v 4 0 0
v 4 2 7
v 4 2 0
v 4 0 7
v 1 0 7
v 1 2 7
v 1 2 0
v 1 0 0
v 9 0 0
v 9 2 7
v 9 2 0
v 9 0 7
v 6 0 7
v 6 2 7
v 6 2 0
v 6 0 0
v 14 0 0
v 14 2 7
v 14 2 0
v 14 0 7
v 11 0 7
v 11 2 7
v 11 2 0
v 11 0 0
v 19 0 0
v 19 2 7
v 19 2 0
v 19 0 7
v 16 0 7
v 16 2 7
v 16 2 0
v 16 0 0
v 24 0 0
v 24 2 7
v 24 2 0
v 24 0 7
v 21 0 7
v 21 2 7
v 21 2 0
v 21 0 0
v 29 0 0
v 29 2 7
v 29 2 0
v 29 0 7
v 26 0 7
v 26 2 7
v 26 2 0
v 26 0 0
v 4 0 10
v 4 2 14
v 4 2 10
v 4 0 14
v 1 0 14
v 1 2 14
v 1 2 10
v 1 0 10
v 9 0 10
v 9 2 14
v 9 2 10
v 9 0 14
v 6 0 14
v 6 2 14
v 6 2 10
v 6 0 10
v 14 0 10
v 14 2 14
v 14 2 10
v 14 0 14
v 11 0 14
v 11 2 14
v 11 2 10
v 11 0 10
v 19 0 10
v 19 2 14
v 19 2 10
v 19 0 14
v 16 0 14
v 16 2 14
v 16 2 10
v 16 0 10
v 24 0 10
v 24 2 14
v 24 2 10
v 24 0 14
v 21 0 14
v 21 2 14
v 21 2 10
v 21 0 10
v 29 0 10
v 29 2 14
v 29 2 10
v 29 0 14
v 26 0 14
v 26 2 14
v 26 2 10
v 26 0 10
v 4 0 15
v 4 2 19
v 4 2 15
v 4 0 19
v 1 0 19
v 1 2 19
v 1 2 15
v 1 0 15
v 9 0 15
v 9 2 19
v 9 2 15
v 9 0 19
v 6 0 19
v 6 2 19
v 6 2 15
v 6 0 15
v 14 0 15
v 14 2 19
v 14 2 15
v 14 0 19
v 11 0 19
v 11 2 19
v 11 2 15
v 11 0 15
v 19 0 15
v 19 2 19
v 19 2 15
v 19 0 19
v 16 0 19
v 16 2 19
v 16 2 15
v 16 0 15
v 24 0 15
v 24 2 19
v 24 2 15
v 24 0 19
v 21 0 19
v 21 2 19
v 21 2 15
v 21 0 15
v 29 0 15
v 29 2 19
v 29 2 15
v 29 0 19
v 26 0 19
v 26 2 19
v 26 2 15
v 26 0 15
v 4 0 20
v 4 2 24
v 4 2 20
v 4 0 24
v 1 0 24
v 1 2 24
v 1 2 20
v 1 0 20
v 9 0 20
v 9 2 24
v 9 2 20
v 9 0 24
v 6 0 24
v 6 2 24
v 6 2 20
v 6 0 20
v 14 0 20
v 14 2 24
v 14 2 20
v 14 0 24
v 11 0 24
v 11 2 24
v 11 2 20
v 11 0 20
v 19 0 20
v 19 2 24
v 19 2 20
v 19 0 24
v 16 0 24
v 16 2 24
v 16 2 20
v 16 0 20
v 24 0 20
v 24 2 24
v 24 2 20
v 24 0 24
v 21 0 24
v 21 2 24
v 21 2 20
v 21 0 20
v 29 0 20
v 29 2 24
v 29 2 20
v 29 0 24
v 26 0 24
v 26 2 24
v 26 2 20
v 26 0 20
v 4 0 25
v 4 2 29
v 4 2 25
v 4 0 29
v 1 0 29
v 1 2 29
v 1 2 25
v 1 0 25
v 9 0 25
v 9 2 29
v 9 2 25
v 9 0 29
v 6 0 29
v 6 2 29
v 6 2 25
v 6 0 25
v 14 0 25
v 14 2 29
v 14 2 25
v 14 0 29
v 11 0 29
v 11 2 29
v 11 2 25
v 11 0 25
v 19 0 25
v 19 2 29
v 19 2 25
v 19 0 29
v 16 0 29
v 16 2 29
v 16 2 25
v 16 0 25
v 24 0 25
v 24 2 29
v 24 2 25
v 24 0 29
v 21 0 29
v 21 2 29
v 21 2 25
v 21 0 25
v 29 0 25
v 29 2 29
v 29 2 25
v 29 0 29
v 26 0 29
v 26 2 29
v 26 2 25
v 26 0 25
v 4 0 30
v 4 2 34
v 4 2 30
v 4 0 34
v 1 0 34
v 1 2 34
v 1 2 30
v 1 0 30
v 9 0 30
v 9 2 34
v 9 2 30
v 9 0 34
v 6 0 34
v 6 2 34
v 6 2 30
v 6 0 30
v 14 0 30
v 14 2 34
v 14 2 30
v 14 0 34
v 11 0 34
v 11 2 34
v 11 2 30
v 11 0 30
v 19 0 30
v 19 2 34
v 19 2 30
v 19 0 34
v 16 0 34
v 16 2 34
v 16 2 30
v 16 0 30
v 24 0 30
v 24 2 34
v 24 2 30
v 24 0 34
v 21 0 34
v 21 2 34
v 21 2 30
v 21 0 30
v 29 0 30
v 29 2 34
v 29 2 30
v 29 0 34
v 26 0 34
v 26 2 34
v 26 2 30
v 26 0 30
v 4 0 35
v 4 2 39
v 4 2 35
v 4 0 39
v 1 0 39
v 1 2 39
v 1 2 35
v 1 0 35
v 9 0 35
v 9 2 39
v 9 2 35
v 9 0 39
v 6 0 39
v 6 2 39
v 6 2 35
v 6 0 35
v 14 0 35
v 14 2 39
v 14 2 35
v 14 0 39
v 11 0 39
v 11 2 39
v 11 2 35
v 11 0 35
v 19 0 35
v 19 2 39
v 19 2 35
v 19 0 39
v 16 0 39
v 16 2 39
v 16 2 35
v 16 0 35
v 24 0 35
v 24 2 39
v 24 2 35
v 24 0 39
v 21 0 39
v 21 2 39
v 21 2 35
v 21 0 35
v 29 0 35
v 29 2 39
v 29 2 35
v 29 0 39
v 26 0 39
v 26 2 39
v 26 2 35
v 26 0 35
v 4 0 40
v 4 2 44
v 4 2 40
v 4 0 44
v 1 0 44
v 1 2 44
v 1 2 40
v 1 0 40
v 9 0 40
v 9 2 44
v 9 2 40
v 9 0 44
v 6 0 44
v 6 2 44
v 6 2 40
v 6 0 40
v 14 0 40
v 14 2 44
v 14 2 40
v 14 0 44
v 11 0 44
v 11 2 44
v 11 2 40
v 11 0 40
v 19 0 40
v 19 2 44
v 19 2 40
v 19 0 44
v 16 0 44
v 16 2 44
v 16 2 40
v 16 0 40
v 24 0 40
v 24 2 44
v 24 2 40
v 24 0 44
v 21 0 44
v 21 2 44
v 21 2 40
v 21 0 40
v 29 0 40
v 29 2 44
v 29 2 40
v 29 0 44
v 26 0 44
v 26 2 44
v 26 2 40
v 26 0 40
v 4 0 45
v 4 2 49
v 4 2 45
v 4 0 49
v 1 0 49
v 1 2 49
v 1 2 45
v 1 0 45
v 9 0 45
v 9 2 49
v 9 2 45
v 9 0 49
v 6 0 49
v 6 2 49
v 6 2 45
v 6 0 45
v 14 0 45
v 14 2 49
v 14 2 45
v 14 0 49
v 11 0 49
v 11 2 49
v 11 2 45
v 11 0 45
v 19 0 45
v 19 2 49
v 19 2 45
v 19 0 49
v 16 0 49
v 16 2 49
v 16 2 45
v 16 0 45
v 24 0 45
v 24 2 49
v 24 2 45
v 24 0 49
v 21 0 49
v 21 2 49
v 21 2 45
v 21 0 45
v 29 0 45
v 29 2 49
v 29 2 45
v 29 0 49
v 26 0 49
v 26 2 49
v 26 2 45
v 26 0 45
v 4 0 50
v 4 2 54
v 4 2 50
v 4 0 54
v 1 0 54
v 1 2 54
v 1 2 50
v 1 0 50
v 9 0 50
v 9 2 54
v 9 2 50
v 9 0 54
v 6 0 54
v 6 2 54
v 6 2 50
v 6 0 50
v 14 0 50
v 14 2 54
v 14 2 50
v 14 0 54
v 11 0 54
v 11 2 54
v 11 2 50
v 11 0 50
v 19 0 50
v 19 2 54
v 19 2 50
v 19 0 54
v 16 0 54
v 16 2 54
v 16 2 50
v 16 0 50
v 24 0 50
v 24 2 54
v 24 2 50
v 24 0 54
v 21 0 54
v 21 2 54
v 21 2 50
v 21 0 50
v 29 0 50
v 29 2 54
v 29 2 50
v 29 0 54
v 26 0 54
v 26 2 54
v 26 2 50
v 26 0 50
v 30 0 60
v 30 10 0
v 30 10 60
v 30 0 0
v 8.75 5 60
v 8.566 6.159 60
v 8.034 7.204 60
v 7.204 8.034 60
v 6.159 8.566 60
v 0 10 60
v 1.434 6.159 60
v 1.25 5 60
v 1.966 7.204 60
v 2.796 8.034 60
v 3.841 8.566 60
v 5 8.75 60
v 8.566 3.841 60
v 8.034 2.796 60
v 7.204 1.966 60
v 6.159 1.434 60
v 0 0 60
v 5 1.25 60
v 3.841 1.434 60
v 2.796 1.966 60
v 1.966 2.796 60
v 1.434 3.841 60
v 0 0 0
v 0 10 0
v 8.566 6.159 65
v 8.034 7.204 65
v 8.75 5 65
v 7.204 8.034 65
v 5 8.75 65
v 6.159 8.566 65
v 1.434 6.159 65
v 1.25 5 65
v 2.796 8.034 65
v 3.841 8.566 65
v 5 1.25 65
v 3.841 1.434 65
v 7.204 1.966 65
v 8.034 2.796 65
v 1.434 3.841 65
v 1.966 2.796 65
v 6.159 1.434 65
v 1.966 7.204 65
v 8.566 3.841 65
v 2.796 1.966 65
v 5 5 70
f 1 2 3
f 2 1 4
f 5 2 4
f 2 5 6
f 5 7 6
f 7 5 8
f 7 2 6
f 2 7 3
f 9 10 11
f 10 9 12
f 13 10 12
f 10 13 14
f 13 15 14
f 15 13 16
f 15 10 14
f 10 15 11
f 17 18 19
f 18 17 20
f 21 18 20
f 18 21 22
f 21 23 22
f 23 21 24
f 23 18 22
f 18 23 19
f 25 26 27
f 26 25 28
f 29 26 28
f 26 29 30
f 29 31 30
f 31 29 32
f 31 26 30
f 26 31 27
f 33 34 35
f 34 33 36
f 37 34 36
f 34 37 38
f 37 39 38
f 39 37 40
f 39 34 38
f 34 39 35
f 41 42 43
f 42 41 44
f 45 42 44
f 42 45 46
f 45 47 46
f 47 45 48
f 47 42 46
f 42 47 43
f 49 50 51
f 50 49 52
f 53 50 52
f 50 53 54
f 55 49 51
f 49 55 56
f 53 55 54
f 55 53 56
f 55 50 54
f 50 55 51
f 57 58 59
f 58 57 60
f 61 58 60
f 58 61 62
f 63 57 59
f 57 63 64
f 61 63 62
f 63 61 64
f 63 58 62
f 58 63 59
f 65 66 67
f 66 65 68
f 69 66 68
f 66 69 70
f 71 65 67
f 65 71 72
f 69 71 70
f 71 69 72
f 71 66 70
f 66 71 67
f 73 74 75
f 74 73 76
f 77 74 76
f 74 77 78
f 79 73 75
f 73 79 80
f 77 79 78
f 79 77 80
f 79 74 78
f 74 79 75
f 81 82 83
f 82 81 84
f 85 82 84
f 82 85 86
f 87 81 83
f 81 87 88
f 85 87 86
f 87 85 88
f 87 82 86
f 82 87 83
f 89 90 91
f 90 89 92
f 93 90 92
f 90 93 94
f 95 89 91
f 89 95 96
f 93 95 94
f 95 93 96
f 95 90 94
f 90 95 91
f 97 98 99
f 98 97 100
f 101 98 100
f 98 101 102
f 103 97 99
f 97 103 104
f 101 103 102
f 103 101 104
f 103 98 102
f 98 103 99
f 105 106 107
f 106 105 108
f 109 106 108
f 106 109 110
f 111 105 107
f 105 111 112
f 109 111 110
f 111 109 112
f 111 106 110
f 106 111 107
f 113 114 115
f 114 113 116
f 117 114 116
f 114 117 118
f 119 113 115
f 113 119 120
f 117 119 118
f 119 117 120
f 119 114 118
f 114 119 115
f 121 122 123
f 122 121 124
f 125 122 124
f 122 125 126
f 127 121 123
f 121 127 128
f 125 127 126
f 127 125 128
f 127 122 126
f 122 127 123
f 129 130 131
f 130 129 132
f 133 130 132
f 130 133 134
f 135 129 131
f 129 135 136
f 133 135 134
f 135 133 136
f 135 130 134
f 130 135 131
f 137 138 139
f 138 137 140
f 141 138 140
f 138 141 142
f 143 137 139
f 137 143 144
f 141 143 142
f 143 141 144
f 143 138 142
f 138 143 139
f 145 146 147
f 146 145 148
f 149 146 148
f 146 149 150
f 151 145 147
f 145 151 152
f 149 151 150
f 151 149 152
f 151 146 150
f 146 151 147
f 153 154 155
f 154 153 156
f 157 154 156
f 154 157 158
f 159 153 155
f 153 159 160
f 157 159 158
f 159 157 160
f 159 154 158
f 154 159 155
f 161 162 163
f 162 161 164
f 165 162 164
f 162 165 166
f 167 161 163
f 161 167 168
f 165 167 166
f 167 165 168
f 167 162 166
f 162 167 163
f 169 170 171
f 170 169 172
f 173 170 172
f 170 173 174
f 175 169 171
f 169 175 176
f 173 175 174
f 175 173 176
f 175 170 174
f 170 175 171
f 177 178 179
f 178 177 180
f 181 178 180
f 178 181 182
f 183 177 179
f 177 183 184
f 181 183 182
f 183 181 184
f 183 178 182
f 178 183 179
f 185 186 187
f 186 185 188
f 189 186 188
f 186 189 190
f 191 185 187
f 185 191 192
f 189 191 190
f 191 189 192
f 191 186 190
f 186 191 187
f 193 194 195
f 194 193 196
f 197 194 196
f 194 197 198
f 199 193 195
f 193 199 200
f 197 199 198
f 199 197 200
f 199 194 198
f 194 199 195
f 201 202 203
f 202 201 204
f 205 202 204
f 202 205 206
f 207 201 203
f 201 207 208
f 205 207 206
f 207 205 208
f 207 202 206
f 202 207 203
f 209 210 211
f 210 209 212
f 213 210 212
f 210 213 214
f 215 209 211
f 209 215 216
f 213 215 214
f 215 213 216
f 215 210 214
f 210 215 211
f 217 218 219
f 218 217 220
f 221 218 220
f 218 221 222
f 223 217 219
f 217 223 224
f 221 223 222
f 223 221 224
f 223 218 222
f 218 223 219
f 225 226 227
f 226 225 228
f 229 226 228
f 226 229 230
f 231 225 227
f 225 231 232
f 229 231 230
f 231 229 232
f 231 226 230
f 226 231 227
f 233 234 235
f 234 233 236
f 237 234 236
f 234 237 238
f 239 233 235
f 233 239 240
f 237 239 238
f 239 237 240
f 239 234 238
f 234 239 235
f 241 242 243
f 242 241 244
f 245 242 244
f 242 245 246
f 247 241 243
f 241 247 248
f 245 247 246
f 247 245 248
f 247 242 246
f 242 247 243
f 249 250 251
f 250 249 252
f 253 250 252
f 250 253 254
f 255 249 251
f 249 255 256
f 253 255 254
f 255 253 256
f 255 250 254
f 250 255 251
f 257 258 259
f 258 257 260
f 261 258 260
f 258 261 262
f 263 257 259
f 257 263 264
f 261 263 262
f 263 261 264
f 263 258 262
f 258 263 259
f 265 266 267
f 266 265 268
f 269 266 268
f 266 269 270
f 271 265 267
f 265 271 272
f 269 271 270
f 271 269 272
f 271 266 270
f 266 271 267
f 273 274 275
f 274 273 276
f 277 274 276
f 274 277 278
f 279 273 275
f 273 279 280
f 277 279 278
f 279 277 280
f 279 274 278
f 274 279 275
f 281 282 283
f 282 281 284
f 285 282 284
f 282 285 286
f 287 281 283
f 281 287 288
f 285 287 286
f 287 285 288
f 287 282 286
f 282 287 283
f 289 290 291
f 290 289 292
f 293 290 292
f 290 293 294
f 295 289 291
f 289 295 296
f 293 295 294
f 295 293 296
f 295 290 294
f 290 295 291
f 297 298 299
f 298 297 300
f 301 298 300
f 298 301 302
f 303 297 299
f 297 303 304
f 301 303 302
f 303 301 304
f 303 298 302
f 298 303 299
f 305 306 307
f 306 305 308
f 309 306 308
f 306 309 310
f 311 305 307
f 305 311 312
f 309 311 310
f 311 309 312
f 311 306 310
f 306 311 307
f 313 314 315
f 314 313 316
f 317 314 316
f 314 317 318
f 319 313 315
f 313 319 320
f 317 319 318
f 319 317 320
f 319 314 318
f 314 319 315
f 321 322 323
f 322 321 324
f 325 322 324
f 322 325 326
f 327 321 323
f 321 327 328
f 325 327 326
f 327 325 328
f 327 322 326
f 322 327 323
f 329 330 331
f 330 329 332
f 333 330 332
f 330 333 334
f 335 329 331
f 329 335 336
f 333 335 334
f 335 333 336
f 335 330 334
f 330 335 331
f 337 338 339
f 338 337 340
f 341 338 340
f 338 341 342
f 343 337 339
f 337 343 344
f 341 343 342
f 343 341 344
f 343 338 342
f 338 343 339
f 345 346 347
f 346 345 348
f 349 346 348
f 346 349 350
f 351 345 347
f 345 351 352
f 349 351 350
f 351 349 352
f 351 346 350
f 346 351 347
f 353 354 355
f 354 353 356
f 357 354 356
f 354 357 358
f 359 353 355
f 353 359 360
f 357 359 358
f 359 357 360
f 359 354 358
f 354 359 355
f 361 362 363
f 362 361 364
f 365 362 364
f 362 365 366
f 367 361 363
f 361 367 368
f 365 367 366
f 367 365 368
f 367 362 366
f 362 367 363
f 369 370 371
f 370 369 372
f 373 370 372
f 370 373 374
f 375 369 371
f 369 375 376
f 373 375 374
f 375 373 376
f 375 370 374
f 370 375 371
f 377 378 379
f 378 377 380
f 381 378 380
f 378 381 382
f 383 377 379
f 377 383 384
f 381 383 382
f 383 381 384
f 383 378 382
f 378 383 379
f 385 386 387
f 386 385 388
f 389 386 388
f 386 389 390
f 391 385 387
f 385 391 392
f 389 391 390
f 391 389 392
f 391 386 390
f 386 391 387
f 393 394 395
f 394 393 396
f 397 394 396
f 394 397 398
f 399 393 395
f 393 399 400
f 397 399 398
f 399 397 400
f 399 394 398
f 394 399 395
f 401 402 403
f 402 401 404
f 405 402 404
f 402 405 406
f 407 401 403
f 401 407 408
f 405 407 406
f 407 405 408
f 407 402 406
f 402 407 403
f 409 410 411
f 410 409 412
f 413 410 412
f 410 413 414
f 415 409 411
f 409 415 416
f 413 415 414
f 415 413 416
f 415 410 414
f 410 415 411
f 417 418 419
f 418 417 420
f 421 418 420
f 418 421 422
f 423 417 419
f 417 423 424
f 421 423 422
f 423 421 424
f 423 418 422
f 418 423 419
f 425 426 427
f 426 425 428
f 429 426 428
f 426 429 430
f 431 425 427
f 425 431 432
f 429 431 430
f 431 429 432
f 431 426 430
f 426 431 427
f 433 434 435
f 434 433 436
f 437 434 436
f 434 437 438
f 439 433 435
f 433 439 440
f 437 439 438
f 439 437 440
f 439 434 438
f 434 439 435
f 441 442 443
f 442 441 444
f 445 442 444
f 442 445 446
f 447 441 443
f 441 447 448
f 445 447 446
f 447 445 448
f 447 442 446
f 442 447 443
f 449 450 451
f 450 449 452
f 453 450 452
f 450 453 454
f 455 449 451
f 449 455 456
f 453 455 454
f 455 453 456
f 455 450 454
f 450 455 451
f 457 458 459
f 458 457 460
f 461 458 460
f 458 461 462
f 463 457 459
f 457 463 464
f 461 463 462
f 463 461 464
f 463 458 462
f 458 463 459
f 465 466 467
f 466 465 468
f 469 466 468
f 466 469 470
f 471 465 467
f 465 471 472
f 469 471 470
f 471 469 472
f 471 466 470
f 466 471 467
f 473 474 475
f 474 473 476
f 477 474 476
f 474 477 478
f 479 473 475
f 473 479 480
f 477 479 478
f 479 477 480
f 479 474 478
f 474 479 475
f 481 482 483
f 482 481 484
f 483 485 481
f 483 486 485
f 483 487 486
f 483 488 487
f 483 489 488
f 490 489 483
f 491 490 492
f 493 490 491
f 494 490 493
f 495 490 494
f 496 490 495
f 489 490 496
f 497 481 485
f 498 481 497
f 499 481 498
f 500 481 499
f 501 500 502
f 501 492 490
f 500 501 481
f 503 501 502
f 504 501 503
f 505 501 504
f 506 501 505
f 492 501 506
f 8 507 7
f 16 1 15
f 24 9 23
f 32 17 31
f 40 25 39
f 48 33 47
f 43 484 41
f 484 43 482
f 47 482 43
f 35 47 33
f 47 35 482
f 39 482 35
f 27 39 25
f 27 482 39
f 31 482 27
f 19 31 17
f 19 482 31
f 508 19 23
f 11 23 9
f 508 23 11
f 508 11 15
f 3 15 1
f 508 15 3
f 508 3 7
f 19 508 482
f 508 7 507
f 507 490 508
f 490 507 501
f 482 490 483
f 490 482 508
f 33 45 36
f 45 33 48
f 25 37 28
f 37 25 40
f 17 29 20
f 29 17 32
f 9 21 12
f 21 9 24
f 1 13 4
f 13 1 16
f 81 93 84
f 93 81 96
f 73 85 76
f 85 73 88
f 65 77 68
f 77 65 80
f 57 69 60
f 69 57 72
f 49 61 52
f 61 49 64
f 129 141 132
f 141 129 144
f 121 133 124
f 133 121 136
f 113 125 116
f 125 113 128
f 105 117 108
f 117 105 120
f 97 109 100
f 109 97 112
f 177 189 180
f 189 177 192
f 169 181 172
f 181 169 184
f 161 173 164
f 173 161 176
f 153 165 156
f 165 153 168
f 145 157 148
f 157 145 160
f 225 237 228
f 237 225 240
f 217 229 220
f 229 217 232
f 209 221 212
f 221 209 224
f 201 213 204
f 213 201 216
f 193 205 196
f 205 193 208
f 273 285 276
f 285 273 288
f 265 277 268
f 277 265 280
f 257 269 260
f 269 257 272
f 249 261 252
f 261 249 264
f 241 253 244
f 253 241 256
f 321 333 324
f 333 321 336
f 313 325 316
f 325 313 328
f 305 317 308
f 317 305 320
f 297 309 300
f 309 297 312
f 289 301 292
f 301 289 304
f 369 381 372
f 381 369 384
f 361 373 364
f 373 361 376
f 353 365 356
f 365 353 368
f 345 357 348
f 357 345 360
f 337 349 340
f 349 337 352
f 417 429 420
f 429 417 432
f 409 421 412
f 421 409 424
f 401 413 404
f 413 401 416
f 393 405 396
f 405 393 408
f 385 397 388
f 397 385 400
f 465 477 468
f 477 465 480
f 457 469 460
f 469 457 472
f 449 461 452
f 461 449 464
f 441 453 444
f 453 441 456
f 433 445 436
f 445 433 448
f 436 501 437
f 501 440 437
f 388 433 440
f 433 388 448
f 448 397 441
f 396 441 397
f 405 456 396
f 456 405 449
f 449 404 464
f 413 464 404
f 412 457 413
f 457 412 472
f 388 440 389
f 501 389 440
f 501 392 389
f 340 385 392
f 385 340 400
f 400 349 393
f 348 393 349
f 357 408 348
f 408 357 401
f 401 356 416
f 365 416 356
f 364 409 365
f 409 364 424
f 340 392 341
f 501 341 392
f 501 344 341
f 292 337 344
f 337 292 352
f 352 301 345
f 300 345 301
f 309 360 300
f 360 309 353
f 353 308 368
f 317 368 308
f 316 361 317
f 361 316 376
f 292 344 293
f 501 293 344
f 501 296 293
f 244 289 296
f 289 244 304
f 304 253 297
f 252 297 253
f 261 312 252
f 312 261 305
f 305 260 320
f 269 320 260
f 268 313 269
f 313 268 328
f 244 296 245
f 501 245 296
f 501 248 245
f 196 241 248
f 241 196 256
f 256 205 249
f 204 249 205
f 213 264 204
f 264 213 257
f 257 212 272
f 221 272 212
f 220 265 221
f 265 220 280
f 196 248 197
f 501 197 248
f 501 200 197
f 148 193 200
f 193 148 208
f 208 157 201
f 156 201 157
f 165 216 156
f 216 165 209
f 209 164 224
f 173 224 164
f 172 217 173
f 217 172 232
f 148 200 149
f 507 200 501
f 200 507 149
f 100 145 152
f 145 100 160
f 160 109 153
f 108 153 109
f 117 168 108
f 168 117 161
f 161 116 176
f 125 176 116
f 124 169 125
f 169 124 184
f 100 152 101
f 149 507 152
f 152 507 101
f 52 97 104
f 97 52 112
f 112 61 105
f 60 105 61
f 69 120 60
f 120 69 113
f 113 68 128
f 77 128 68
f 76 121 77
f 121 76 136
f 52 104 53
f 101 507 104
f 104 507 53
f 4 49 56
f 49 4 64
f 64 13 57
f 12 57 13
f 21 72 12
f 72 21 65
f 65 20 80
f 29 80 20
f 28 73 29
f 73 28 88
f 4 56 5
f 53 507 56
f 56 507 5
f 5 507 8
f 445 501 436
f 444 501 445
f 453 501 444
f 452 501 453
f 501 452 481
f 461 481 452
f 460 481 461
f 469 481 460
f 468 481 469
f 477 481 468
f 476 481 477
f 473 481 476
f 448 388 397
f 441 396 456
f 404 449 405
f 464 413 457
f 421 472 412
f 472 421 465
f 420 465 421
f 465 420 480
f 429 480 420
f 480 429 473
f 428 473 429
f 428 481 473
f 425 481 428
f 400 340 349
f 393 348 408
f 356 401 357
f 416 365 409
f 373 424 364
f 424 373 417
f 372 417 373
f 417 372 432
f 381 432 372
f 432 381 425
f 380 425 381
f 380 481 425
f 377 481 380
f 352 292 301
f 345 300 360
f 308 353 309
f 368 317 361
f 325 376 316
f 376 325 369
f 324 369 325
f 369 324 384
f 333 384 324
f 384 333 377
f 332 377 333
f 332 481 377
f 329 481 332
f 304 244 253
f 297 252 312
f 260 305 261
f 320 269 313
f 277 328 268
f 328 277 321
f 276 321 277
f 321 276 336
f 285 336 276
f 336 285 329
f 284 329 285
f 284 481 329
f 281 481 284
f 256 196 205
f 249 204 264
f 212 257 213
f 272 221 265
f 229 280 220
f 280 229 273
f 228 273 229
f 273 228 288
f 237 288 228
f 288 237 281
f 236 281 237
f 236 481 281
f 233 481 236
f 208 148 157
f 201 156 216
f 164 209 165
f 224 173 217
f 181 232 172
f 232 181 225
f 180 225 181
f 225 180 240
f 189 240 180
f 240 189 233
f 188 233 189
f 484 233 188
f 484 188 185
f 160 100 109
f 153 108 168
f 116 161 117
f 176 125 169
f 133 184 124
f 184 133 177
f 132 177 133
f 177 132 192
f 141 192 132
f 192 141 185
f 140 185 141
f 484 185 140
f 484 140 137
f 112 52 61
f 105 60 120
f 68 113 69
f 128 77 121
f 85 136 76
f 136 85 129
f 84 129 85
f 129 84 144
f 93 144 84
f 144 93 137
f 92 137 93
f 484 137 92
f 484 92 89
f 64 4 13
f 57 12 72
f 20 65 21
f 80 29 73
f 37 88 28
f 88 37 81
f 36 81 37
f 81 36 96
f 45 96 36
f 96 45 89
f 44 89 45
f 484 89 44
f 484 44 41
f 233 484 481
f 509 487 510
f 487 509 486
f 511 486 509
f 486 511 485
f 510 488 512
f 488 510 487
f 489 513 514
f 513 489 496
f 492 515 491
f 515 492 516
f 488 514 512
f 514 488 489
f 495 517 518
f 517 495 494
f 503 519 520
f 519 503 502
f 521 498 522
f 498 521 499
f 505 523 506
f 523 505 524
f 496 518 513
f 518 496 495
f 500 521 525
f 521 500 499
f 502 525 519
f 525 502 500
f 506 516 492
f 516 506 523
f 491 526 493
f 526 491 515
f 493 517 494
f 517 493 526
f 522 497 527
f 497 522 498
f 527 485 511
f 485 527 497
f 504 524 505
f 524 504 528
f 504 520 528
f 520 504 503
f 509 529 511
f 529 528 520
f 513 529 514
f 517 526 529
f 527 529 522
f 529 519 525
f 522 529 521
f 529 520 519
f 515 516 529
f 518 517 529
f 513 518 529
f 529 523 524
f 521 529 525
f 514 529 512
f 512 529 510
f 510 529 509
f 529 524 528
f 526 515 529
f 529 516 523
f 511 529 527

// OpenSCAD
num_rows = 10;
num_col = 6;

building_width = num_col * 5;
building_height = num_rows * 6;

difference() {
  cube([building_width, 10, building_height]);

  for (z = [1:1:num_rows]) {
    for (x = [0:1:num_col-1]) {
      if (z == 1) {
        translate([x*5 + 1, -1, -1]) cube([3, 3, 8]);
      }
      else {
        translate([x*5 + 1, -1, z*5]) cube([3, 3, 4]);
      }
    }
  }
}

draw_tower = rands(0, 1, 1);

if (draw_tower[0] < 0.5) {
  translate([building_width/6, 5, building_height])
    watertower(building_width/4);
}

module watertower(width) {
  $fn = 20;
  cylinder(h=5, r=width/2);
  translate([0, 0, 5]) cylinder(h=5, r1=width/2, r2=0);
}
